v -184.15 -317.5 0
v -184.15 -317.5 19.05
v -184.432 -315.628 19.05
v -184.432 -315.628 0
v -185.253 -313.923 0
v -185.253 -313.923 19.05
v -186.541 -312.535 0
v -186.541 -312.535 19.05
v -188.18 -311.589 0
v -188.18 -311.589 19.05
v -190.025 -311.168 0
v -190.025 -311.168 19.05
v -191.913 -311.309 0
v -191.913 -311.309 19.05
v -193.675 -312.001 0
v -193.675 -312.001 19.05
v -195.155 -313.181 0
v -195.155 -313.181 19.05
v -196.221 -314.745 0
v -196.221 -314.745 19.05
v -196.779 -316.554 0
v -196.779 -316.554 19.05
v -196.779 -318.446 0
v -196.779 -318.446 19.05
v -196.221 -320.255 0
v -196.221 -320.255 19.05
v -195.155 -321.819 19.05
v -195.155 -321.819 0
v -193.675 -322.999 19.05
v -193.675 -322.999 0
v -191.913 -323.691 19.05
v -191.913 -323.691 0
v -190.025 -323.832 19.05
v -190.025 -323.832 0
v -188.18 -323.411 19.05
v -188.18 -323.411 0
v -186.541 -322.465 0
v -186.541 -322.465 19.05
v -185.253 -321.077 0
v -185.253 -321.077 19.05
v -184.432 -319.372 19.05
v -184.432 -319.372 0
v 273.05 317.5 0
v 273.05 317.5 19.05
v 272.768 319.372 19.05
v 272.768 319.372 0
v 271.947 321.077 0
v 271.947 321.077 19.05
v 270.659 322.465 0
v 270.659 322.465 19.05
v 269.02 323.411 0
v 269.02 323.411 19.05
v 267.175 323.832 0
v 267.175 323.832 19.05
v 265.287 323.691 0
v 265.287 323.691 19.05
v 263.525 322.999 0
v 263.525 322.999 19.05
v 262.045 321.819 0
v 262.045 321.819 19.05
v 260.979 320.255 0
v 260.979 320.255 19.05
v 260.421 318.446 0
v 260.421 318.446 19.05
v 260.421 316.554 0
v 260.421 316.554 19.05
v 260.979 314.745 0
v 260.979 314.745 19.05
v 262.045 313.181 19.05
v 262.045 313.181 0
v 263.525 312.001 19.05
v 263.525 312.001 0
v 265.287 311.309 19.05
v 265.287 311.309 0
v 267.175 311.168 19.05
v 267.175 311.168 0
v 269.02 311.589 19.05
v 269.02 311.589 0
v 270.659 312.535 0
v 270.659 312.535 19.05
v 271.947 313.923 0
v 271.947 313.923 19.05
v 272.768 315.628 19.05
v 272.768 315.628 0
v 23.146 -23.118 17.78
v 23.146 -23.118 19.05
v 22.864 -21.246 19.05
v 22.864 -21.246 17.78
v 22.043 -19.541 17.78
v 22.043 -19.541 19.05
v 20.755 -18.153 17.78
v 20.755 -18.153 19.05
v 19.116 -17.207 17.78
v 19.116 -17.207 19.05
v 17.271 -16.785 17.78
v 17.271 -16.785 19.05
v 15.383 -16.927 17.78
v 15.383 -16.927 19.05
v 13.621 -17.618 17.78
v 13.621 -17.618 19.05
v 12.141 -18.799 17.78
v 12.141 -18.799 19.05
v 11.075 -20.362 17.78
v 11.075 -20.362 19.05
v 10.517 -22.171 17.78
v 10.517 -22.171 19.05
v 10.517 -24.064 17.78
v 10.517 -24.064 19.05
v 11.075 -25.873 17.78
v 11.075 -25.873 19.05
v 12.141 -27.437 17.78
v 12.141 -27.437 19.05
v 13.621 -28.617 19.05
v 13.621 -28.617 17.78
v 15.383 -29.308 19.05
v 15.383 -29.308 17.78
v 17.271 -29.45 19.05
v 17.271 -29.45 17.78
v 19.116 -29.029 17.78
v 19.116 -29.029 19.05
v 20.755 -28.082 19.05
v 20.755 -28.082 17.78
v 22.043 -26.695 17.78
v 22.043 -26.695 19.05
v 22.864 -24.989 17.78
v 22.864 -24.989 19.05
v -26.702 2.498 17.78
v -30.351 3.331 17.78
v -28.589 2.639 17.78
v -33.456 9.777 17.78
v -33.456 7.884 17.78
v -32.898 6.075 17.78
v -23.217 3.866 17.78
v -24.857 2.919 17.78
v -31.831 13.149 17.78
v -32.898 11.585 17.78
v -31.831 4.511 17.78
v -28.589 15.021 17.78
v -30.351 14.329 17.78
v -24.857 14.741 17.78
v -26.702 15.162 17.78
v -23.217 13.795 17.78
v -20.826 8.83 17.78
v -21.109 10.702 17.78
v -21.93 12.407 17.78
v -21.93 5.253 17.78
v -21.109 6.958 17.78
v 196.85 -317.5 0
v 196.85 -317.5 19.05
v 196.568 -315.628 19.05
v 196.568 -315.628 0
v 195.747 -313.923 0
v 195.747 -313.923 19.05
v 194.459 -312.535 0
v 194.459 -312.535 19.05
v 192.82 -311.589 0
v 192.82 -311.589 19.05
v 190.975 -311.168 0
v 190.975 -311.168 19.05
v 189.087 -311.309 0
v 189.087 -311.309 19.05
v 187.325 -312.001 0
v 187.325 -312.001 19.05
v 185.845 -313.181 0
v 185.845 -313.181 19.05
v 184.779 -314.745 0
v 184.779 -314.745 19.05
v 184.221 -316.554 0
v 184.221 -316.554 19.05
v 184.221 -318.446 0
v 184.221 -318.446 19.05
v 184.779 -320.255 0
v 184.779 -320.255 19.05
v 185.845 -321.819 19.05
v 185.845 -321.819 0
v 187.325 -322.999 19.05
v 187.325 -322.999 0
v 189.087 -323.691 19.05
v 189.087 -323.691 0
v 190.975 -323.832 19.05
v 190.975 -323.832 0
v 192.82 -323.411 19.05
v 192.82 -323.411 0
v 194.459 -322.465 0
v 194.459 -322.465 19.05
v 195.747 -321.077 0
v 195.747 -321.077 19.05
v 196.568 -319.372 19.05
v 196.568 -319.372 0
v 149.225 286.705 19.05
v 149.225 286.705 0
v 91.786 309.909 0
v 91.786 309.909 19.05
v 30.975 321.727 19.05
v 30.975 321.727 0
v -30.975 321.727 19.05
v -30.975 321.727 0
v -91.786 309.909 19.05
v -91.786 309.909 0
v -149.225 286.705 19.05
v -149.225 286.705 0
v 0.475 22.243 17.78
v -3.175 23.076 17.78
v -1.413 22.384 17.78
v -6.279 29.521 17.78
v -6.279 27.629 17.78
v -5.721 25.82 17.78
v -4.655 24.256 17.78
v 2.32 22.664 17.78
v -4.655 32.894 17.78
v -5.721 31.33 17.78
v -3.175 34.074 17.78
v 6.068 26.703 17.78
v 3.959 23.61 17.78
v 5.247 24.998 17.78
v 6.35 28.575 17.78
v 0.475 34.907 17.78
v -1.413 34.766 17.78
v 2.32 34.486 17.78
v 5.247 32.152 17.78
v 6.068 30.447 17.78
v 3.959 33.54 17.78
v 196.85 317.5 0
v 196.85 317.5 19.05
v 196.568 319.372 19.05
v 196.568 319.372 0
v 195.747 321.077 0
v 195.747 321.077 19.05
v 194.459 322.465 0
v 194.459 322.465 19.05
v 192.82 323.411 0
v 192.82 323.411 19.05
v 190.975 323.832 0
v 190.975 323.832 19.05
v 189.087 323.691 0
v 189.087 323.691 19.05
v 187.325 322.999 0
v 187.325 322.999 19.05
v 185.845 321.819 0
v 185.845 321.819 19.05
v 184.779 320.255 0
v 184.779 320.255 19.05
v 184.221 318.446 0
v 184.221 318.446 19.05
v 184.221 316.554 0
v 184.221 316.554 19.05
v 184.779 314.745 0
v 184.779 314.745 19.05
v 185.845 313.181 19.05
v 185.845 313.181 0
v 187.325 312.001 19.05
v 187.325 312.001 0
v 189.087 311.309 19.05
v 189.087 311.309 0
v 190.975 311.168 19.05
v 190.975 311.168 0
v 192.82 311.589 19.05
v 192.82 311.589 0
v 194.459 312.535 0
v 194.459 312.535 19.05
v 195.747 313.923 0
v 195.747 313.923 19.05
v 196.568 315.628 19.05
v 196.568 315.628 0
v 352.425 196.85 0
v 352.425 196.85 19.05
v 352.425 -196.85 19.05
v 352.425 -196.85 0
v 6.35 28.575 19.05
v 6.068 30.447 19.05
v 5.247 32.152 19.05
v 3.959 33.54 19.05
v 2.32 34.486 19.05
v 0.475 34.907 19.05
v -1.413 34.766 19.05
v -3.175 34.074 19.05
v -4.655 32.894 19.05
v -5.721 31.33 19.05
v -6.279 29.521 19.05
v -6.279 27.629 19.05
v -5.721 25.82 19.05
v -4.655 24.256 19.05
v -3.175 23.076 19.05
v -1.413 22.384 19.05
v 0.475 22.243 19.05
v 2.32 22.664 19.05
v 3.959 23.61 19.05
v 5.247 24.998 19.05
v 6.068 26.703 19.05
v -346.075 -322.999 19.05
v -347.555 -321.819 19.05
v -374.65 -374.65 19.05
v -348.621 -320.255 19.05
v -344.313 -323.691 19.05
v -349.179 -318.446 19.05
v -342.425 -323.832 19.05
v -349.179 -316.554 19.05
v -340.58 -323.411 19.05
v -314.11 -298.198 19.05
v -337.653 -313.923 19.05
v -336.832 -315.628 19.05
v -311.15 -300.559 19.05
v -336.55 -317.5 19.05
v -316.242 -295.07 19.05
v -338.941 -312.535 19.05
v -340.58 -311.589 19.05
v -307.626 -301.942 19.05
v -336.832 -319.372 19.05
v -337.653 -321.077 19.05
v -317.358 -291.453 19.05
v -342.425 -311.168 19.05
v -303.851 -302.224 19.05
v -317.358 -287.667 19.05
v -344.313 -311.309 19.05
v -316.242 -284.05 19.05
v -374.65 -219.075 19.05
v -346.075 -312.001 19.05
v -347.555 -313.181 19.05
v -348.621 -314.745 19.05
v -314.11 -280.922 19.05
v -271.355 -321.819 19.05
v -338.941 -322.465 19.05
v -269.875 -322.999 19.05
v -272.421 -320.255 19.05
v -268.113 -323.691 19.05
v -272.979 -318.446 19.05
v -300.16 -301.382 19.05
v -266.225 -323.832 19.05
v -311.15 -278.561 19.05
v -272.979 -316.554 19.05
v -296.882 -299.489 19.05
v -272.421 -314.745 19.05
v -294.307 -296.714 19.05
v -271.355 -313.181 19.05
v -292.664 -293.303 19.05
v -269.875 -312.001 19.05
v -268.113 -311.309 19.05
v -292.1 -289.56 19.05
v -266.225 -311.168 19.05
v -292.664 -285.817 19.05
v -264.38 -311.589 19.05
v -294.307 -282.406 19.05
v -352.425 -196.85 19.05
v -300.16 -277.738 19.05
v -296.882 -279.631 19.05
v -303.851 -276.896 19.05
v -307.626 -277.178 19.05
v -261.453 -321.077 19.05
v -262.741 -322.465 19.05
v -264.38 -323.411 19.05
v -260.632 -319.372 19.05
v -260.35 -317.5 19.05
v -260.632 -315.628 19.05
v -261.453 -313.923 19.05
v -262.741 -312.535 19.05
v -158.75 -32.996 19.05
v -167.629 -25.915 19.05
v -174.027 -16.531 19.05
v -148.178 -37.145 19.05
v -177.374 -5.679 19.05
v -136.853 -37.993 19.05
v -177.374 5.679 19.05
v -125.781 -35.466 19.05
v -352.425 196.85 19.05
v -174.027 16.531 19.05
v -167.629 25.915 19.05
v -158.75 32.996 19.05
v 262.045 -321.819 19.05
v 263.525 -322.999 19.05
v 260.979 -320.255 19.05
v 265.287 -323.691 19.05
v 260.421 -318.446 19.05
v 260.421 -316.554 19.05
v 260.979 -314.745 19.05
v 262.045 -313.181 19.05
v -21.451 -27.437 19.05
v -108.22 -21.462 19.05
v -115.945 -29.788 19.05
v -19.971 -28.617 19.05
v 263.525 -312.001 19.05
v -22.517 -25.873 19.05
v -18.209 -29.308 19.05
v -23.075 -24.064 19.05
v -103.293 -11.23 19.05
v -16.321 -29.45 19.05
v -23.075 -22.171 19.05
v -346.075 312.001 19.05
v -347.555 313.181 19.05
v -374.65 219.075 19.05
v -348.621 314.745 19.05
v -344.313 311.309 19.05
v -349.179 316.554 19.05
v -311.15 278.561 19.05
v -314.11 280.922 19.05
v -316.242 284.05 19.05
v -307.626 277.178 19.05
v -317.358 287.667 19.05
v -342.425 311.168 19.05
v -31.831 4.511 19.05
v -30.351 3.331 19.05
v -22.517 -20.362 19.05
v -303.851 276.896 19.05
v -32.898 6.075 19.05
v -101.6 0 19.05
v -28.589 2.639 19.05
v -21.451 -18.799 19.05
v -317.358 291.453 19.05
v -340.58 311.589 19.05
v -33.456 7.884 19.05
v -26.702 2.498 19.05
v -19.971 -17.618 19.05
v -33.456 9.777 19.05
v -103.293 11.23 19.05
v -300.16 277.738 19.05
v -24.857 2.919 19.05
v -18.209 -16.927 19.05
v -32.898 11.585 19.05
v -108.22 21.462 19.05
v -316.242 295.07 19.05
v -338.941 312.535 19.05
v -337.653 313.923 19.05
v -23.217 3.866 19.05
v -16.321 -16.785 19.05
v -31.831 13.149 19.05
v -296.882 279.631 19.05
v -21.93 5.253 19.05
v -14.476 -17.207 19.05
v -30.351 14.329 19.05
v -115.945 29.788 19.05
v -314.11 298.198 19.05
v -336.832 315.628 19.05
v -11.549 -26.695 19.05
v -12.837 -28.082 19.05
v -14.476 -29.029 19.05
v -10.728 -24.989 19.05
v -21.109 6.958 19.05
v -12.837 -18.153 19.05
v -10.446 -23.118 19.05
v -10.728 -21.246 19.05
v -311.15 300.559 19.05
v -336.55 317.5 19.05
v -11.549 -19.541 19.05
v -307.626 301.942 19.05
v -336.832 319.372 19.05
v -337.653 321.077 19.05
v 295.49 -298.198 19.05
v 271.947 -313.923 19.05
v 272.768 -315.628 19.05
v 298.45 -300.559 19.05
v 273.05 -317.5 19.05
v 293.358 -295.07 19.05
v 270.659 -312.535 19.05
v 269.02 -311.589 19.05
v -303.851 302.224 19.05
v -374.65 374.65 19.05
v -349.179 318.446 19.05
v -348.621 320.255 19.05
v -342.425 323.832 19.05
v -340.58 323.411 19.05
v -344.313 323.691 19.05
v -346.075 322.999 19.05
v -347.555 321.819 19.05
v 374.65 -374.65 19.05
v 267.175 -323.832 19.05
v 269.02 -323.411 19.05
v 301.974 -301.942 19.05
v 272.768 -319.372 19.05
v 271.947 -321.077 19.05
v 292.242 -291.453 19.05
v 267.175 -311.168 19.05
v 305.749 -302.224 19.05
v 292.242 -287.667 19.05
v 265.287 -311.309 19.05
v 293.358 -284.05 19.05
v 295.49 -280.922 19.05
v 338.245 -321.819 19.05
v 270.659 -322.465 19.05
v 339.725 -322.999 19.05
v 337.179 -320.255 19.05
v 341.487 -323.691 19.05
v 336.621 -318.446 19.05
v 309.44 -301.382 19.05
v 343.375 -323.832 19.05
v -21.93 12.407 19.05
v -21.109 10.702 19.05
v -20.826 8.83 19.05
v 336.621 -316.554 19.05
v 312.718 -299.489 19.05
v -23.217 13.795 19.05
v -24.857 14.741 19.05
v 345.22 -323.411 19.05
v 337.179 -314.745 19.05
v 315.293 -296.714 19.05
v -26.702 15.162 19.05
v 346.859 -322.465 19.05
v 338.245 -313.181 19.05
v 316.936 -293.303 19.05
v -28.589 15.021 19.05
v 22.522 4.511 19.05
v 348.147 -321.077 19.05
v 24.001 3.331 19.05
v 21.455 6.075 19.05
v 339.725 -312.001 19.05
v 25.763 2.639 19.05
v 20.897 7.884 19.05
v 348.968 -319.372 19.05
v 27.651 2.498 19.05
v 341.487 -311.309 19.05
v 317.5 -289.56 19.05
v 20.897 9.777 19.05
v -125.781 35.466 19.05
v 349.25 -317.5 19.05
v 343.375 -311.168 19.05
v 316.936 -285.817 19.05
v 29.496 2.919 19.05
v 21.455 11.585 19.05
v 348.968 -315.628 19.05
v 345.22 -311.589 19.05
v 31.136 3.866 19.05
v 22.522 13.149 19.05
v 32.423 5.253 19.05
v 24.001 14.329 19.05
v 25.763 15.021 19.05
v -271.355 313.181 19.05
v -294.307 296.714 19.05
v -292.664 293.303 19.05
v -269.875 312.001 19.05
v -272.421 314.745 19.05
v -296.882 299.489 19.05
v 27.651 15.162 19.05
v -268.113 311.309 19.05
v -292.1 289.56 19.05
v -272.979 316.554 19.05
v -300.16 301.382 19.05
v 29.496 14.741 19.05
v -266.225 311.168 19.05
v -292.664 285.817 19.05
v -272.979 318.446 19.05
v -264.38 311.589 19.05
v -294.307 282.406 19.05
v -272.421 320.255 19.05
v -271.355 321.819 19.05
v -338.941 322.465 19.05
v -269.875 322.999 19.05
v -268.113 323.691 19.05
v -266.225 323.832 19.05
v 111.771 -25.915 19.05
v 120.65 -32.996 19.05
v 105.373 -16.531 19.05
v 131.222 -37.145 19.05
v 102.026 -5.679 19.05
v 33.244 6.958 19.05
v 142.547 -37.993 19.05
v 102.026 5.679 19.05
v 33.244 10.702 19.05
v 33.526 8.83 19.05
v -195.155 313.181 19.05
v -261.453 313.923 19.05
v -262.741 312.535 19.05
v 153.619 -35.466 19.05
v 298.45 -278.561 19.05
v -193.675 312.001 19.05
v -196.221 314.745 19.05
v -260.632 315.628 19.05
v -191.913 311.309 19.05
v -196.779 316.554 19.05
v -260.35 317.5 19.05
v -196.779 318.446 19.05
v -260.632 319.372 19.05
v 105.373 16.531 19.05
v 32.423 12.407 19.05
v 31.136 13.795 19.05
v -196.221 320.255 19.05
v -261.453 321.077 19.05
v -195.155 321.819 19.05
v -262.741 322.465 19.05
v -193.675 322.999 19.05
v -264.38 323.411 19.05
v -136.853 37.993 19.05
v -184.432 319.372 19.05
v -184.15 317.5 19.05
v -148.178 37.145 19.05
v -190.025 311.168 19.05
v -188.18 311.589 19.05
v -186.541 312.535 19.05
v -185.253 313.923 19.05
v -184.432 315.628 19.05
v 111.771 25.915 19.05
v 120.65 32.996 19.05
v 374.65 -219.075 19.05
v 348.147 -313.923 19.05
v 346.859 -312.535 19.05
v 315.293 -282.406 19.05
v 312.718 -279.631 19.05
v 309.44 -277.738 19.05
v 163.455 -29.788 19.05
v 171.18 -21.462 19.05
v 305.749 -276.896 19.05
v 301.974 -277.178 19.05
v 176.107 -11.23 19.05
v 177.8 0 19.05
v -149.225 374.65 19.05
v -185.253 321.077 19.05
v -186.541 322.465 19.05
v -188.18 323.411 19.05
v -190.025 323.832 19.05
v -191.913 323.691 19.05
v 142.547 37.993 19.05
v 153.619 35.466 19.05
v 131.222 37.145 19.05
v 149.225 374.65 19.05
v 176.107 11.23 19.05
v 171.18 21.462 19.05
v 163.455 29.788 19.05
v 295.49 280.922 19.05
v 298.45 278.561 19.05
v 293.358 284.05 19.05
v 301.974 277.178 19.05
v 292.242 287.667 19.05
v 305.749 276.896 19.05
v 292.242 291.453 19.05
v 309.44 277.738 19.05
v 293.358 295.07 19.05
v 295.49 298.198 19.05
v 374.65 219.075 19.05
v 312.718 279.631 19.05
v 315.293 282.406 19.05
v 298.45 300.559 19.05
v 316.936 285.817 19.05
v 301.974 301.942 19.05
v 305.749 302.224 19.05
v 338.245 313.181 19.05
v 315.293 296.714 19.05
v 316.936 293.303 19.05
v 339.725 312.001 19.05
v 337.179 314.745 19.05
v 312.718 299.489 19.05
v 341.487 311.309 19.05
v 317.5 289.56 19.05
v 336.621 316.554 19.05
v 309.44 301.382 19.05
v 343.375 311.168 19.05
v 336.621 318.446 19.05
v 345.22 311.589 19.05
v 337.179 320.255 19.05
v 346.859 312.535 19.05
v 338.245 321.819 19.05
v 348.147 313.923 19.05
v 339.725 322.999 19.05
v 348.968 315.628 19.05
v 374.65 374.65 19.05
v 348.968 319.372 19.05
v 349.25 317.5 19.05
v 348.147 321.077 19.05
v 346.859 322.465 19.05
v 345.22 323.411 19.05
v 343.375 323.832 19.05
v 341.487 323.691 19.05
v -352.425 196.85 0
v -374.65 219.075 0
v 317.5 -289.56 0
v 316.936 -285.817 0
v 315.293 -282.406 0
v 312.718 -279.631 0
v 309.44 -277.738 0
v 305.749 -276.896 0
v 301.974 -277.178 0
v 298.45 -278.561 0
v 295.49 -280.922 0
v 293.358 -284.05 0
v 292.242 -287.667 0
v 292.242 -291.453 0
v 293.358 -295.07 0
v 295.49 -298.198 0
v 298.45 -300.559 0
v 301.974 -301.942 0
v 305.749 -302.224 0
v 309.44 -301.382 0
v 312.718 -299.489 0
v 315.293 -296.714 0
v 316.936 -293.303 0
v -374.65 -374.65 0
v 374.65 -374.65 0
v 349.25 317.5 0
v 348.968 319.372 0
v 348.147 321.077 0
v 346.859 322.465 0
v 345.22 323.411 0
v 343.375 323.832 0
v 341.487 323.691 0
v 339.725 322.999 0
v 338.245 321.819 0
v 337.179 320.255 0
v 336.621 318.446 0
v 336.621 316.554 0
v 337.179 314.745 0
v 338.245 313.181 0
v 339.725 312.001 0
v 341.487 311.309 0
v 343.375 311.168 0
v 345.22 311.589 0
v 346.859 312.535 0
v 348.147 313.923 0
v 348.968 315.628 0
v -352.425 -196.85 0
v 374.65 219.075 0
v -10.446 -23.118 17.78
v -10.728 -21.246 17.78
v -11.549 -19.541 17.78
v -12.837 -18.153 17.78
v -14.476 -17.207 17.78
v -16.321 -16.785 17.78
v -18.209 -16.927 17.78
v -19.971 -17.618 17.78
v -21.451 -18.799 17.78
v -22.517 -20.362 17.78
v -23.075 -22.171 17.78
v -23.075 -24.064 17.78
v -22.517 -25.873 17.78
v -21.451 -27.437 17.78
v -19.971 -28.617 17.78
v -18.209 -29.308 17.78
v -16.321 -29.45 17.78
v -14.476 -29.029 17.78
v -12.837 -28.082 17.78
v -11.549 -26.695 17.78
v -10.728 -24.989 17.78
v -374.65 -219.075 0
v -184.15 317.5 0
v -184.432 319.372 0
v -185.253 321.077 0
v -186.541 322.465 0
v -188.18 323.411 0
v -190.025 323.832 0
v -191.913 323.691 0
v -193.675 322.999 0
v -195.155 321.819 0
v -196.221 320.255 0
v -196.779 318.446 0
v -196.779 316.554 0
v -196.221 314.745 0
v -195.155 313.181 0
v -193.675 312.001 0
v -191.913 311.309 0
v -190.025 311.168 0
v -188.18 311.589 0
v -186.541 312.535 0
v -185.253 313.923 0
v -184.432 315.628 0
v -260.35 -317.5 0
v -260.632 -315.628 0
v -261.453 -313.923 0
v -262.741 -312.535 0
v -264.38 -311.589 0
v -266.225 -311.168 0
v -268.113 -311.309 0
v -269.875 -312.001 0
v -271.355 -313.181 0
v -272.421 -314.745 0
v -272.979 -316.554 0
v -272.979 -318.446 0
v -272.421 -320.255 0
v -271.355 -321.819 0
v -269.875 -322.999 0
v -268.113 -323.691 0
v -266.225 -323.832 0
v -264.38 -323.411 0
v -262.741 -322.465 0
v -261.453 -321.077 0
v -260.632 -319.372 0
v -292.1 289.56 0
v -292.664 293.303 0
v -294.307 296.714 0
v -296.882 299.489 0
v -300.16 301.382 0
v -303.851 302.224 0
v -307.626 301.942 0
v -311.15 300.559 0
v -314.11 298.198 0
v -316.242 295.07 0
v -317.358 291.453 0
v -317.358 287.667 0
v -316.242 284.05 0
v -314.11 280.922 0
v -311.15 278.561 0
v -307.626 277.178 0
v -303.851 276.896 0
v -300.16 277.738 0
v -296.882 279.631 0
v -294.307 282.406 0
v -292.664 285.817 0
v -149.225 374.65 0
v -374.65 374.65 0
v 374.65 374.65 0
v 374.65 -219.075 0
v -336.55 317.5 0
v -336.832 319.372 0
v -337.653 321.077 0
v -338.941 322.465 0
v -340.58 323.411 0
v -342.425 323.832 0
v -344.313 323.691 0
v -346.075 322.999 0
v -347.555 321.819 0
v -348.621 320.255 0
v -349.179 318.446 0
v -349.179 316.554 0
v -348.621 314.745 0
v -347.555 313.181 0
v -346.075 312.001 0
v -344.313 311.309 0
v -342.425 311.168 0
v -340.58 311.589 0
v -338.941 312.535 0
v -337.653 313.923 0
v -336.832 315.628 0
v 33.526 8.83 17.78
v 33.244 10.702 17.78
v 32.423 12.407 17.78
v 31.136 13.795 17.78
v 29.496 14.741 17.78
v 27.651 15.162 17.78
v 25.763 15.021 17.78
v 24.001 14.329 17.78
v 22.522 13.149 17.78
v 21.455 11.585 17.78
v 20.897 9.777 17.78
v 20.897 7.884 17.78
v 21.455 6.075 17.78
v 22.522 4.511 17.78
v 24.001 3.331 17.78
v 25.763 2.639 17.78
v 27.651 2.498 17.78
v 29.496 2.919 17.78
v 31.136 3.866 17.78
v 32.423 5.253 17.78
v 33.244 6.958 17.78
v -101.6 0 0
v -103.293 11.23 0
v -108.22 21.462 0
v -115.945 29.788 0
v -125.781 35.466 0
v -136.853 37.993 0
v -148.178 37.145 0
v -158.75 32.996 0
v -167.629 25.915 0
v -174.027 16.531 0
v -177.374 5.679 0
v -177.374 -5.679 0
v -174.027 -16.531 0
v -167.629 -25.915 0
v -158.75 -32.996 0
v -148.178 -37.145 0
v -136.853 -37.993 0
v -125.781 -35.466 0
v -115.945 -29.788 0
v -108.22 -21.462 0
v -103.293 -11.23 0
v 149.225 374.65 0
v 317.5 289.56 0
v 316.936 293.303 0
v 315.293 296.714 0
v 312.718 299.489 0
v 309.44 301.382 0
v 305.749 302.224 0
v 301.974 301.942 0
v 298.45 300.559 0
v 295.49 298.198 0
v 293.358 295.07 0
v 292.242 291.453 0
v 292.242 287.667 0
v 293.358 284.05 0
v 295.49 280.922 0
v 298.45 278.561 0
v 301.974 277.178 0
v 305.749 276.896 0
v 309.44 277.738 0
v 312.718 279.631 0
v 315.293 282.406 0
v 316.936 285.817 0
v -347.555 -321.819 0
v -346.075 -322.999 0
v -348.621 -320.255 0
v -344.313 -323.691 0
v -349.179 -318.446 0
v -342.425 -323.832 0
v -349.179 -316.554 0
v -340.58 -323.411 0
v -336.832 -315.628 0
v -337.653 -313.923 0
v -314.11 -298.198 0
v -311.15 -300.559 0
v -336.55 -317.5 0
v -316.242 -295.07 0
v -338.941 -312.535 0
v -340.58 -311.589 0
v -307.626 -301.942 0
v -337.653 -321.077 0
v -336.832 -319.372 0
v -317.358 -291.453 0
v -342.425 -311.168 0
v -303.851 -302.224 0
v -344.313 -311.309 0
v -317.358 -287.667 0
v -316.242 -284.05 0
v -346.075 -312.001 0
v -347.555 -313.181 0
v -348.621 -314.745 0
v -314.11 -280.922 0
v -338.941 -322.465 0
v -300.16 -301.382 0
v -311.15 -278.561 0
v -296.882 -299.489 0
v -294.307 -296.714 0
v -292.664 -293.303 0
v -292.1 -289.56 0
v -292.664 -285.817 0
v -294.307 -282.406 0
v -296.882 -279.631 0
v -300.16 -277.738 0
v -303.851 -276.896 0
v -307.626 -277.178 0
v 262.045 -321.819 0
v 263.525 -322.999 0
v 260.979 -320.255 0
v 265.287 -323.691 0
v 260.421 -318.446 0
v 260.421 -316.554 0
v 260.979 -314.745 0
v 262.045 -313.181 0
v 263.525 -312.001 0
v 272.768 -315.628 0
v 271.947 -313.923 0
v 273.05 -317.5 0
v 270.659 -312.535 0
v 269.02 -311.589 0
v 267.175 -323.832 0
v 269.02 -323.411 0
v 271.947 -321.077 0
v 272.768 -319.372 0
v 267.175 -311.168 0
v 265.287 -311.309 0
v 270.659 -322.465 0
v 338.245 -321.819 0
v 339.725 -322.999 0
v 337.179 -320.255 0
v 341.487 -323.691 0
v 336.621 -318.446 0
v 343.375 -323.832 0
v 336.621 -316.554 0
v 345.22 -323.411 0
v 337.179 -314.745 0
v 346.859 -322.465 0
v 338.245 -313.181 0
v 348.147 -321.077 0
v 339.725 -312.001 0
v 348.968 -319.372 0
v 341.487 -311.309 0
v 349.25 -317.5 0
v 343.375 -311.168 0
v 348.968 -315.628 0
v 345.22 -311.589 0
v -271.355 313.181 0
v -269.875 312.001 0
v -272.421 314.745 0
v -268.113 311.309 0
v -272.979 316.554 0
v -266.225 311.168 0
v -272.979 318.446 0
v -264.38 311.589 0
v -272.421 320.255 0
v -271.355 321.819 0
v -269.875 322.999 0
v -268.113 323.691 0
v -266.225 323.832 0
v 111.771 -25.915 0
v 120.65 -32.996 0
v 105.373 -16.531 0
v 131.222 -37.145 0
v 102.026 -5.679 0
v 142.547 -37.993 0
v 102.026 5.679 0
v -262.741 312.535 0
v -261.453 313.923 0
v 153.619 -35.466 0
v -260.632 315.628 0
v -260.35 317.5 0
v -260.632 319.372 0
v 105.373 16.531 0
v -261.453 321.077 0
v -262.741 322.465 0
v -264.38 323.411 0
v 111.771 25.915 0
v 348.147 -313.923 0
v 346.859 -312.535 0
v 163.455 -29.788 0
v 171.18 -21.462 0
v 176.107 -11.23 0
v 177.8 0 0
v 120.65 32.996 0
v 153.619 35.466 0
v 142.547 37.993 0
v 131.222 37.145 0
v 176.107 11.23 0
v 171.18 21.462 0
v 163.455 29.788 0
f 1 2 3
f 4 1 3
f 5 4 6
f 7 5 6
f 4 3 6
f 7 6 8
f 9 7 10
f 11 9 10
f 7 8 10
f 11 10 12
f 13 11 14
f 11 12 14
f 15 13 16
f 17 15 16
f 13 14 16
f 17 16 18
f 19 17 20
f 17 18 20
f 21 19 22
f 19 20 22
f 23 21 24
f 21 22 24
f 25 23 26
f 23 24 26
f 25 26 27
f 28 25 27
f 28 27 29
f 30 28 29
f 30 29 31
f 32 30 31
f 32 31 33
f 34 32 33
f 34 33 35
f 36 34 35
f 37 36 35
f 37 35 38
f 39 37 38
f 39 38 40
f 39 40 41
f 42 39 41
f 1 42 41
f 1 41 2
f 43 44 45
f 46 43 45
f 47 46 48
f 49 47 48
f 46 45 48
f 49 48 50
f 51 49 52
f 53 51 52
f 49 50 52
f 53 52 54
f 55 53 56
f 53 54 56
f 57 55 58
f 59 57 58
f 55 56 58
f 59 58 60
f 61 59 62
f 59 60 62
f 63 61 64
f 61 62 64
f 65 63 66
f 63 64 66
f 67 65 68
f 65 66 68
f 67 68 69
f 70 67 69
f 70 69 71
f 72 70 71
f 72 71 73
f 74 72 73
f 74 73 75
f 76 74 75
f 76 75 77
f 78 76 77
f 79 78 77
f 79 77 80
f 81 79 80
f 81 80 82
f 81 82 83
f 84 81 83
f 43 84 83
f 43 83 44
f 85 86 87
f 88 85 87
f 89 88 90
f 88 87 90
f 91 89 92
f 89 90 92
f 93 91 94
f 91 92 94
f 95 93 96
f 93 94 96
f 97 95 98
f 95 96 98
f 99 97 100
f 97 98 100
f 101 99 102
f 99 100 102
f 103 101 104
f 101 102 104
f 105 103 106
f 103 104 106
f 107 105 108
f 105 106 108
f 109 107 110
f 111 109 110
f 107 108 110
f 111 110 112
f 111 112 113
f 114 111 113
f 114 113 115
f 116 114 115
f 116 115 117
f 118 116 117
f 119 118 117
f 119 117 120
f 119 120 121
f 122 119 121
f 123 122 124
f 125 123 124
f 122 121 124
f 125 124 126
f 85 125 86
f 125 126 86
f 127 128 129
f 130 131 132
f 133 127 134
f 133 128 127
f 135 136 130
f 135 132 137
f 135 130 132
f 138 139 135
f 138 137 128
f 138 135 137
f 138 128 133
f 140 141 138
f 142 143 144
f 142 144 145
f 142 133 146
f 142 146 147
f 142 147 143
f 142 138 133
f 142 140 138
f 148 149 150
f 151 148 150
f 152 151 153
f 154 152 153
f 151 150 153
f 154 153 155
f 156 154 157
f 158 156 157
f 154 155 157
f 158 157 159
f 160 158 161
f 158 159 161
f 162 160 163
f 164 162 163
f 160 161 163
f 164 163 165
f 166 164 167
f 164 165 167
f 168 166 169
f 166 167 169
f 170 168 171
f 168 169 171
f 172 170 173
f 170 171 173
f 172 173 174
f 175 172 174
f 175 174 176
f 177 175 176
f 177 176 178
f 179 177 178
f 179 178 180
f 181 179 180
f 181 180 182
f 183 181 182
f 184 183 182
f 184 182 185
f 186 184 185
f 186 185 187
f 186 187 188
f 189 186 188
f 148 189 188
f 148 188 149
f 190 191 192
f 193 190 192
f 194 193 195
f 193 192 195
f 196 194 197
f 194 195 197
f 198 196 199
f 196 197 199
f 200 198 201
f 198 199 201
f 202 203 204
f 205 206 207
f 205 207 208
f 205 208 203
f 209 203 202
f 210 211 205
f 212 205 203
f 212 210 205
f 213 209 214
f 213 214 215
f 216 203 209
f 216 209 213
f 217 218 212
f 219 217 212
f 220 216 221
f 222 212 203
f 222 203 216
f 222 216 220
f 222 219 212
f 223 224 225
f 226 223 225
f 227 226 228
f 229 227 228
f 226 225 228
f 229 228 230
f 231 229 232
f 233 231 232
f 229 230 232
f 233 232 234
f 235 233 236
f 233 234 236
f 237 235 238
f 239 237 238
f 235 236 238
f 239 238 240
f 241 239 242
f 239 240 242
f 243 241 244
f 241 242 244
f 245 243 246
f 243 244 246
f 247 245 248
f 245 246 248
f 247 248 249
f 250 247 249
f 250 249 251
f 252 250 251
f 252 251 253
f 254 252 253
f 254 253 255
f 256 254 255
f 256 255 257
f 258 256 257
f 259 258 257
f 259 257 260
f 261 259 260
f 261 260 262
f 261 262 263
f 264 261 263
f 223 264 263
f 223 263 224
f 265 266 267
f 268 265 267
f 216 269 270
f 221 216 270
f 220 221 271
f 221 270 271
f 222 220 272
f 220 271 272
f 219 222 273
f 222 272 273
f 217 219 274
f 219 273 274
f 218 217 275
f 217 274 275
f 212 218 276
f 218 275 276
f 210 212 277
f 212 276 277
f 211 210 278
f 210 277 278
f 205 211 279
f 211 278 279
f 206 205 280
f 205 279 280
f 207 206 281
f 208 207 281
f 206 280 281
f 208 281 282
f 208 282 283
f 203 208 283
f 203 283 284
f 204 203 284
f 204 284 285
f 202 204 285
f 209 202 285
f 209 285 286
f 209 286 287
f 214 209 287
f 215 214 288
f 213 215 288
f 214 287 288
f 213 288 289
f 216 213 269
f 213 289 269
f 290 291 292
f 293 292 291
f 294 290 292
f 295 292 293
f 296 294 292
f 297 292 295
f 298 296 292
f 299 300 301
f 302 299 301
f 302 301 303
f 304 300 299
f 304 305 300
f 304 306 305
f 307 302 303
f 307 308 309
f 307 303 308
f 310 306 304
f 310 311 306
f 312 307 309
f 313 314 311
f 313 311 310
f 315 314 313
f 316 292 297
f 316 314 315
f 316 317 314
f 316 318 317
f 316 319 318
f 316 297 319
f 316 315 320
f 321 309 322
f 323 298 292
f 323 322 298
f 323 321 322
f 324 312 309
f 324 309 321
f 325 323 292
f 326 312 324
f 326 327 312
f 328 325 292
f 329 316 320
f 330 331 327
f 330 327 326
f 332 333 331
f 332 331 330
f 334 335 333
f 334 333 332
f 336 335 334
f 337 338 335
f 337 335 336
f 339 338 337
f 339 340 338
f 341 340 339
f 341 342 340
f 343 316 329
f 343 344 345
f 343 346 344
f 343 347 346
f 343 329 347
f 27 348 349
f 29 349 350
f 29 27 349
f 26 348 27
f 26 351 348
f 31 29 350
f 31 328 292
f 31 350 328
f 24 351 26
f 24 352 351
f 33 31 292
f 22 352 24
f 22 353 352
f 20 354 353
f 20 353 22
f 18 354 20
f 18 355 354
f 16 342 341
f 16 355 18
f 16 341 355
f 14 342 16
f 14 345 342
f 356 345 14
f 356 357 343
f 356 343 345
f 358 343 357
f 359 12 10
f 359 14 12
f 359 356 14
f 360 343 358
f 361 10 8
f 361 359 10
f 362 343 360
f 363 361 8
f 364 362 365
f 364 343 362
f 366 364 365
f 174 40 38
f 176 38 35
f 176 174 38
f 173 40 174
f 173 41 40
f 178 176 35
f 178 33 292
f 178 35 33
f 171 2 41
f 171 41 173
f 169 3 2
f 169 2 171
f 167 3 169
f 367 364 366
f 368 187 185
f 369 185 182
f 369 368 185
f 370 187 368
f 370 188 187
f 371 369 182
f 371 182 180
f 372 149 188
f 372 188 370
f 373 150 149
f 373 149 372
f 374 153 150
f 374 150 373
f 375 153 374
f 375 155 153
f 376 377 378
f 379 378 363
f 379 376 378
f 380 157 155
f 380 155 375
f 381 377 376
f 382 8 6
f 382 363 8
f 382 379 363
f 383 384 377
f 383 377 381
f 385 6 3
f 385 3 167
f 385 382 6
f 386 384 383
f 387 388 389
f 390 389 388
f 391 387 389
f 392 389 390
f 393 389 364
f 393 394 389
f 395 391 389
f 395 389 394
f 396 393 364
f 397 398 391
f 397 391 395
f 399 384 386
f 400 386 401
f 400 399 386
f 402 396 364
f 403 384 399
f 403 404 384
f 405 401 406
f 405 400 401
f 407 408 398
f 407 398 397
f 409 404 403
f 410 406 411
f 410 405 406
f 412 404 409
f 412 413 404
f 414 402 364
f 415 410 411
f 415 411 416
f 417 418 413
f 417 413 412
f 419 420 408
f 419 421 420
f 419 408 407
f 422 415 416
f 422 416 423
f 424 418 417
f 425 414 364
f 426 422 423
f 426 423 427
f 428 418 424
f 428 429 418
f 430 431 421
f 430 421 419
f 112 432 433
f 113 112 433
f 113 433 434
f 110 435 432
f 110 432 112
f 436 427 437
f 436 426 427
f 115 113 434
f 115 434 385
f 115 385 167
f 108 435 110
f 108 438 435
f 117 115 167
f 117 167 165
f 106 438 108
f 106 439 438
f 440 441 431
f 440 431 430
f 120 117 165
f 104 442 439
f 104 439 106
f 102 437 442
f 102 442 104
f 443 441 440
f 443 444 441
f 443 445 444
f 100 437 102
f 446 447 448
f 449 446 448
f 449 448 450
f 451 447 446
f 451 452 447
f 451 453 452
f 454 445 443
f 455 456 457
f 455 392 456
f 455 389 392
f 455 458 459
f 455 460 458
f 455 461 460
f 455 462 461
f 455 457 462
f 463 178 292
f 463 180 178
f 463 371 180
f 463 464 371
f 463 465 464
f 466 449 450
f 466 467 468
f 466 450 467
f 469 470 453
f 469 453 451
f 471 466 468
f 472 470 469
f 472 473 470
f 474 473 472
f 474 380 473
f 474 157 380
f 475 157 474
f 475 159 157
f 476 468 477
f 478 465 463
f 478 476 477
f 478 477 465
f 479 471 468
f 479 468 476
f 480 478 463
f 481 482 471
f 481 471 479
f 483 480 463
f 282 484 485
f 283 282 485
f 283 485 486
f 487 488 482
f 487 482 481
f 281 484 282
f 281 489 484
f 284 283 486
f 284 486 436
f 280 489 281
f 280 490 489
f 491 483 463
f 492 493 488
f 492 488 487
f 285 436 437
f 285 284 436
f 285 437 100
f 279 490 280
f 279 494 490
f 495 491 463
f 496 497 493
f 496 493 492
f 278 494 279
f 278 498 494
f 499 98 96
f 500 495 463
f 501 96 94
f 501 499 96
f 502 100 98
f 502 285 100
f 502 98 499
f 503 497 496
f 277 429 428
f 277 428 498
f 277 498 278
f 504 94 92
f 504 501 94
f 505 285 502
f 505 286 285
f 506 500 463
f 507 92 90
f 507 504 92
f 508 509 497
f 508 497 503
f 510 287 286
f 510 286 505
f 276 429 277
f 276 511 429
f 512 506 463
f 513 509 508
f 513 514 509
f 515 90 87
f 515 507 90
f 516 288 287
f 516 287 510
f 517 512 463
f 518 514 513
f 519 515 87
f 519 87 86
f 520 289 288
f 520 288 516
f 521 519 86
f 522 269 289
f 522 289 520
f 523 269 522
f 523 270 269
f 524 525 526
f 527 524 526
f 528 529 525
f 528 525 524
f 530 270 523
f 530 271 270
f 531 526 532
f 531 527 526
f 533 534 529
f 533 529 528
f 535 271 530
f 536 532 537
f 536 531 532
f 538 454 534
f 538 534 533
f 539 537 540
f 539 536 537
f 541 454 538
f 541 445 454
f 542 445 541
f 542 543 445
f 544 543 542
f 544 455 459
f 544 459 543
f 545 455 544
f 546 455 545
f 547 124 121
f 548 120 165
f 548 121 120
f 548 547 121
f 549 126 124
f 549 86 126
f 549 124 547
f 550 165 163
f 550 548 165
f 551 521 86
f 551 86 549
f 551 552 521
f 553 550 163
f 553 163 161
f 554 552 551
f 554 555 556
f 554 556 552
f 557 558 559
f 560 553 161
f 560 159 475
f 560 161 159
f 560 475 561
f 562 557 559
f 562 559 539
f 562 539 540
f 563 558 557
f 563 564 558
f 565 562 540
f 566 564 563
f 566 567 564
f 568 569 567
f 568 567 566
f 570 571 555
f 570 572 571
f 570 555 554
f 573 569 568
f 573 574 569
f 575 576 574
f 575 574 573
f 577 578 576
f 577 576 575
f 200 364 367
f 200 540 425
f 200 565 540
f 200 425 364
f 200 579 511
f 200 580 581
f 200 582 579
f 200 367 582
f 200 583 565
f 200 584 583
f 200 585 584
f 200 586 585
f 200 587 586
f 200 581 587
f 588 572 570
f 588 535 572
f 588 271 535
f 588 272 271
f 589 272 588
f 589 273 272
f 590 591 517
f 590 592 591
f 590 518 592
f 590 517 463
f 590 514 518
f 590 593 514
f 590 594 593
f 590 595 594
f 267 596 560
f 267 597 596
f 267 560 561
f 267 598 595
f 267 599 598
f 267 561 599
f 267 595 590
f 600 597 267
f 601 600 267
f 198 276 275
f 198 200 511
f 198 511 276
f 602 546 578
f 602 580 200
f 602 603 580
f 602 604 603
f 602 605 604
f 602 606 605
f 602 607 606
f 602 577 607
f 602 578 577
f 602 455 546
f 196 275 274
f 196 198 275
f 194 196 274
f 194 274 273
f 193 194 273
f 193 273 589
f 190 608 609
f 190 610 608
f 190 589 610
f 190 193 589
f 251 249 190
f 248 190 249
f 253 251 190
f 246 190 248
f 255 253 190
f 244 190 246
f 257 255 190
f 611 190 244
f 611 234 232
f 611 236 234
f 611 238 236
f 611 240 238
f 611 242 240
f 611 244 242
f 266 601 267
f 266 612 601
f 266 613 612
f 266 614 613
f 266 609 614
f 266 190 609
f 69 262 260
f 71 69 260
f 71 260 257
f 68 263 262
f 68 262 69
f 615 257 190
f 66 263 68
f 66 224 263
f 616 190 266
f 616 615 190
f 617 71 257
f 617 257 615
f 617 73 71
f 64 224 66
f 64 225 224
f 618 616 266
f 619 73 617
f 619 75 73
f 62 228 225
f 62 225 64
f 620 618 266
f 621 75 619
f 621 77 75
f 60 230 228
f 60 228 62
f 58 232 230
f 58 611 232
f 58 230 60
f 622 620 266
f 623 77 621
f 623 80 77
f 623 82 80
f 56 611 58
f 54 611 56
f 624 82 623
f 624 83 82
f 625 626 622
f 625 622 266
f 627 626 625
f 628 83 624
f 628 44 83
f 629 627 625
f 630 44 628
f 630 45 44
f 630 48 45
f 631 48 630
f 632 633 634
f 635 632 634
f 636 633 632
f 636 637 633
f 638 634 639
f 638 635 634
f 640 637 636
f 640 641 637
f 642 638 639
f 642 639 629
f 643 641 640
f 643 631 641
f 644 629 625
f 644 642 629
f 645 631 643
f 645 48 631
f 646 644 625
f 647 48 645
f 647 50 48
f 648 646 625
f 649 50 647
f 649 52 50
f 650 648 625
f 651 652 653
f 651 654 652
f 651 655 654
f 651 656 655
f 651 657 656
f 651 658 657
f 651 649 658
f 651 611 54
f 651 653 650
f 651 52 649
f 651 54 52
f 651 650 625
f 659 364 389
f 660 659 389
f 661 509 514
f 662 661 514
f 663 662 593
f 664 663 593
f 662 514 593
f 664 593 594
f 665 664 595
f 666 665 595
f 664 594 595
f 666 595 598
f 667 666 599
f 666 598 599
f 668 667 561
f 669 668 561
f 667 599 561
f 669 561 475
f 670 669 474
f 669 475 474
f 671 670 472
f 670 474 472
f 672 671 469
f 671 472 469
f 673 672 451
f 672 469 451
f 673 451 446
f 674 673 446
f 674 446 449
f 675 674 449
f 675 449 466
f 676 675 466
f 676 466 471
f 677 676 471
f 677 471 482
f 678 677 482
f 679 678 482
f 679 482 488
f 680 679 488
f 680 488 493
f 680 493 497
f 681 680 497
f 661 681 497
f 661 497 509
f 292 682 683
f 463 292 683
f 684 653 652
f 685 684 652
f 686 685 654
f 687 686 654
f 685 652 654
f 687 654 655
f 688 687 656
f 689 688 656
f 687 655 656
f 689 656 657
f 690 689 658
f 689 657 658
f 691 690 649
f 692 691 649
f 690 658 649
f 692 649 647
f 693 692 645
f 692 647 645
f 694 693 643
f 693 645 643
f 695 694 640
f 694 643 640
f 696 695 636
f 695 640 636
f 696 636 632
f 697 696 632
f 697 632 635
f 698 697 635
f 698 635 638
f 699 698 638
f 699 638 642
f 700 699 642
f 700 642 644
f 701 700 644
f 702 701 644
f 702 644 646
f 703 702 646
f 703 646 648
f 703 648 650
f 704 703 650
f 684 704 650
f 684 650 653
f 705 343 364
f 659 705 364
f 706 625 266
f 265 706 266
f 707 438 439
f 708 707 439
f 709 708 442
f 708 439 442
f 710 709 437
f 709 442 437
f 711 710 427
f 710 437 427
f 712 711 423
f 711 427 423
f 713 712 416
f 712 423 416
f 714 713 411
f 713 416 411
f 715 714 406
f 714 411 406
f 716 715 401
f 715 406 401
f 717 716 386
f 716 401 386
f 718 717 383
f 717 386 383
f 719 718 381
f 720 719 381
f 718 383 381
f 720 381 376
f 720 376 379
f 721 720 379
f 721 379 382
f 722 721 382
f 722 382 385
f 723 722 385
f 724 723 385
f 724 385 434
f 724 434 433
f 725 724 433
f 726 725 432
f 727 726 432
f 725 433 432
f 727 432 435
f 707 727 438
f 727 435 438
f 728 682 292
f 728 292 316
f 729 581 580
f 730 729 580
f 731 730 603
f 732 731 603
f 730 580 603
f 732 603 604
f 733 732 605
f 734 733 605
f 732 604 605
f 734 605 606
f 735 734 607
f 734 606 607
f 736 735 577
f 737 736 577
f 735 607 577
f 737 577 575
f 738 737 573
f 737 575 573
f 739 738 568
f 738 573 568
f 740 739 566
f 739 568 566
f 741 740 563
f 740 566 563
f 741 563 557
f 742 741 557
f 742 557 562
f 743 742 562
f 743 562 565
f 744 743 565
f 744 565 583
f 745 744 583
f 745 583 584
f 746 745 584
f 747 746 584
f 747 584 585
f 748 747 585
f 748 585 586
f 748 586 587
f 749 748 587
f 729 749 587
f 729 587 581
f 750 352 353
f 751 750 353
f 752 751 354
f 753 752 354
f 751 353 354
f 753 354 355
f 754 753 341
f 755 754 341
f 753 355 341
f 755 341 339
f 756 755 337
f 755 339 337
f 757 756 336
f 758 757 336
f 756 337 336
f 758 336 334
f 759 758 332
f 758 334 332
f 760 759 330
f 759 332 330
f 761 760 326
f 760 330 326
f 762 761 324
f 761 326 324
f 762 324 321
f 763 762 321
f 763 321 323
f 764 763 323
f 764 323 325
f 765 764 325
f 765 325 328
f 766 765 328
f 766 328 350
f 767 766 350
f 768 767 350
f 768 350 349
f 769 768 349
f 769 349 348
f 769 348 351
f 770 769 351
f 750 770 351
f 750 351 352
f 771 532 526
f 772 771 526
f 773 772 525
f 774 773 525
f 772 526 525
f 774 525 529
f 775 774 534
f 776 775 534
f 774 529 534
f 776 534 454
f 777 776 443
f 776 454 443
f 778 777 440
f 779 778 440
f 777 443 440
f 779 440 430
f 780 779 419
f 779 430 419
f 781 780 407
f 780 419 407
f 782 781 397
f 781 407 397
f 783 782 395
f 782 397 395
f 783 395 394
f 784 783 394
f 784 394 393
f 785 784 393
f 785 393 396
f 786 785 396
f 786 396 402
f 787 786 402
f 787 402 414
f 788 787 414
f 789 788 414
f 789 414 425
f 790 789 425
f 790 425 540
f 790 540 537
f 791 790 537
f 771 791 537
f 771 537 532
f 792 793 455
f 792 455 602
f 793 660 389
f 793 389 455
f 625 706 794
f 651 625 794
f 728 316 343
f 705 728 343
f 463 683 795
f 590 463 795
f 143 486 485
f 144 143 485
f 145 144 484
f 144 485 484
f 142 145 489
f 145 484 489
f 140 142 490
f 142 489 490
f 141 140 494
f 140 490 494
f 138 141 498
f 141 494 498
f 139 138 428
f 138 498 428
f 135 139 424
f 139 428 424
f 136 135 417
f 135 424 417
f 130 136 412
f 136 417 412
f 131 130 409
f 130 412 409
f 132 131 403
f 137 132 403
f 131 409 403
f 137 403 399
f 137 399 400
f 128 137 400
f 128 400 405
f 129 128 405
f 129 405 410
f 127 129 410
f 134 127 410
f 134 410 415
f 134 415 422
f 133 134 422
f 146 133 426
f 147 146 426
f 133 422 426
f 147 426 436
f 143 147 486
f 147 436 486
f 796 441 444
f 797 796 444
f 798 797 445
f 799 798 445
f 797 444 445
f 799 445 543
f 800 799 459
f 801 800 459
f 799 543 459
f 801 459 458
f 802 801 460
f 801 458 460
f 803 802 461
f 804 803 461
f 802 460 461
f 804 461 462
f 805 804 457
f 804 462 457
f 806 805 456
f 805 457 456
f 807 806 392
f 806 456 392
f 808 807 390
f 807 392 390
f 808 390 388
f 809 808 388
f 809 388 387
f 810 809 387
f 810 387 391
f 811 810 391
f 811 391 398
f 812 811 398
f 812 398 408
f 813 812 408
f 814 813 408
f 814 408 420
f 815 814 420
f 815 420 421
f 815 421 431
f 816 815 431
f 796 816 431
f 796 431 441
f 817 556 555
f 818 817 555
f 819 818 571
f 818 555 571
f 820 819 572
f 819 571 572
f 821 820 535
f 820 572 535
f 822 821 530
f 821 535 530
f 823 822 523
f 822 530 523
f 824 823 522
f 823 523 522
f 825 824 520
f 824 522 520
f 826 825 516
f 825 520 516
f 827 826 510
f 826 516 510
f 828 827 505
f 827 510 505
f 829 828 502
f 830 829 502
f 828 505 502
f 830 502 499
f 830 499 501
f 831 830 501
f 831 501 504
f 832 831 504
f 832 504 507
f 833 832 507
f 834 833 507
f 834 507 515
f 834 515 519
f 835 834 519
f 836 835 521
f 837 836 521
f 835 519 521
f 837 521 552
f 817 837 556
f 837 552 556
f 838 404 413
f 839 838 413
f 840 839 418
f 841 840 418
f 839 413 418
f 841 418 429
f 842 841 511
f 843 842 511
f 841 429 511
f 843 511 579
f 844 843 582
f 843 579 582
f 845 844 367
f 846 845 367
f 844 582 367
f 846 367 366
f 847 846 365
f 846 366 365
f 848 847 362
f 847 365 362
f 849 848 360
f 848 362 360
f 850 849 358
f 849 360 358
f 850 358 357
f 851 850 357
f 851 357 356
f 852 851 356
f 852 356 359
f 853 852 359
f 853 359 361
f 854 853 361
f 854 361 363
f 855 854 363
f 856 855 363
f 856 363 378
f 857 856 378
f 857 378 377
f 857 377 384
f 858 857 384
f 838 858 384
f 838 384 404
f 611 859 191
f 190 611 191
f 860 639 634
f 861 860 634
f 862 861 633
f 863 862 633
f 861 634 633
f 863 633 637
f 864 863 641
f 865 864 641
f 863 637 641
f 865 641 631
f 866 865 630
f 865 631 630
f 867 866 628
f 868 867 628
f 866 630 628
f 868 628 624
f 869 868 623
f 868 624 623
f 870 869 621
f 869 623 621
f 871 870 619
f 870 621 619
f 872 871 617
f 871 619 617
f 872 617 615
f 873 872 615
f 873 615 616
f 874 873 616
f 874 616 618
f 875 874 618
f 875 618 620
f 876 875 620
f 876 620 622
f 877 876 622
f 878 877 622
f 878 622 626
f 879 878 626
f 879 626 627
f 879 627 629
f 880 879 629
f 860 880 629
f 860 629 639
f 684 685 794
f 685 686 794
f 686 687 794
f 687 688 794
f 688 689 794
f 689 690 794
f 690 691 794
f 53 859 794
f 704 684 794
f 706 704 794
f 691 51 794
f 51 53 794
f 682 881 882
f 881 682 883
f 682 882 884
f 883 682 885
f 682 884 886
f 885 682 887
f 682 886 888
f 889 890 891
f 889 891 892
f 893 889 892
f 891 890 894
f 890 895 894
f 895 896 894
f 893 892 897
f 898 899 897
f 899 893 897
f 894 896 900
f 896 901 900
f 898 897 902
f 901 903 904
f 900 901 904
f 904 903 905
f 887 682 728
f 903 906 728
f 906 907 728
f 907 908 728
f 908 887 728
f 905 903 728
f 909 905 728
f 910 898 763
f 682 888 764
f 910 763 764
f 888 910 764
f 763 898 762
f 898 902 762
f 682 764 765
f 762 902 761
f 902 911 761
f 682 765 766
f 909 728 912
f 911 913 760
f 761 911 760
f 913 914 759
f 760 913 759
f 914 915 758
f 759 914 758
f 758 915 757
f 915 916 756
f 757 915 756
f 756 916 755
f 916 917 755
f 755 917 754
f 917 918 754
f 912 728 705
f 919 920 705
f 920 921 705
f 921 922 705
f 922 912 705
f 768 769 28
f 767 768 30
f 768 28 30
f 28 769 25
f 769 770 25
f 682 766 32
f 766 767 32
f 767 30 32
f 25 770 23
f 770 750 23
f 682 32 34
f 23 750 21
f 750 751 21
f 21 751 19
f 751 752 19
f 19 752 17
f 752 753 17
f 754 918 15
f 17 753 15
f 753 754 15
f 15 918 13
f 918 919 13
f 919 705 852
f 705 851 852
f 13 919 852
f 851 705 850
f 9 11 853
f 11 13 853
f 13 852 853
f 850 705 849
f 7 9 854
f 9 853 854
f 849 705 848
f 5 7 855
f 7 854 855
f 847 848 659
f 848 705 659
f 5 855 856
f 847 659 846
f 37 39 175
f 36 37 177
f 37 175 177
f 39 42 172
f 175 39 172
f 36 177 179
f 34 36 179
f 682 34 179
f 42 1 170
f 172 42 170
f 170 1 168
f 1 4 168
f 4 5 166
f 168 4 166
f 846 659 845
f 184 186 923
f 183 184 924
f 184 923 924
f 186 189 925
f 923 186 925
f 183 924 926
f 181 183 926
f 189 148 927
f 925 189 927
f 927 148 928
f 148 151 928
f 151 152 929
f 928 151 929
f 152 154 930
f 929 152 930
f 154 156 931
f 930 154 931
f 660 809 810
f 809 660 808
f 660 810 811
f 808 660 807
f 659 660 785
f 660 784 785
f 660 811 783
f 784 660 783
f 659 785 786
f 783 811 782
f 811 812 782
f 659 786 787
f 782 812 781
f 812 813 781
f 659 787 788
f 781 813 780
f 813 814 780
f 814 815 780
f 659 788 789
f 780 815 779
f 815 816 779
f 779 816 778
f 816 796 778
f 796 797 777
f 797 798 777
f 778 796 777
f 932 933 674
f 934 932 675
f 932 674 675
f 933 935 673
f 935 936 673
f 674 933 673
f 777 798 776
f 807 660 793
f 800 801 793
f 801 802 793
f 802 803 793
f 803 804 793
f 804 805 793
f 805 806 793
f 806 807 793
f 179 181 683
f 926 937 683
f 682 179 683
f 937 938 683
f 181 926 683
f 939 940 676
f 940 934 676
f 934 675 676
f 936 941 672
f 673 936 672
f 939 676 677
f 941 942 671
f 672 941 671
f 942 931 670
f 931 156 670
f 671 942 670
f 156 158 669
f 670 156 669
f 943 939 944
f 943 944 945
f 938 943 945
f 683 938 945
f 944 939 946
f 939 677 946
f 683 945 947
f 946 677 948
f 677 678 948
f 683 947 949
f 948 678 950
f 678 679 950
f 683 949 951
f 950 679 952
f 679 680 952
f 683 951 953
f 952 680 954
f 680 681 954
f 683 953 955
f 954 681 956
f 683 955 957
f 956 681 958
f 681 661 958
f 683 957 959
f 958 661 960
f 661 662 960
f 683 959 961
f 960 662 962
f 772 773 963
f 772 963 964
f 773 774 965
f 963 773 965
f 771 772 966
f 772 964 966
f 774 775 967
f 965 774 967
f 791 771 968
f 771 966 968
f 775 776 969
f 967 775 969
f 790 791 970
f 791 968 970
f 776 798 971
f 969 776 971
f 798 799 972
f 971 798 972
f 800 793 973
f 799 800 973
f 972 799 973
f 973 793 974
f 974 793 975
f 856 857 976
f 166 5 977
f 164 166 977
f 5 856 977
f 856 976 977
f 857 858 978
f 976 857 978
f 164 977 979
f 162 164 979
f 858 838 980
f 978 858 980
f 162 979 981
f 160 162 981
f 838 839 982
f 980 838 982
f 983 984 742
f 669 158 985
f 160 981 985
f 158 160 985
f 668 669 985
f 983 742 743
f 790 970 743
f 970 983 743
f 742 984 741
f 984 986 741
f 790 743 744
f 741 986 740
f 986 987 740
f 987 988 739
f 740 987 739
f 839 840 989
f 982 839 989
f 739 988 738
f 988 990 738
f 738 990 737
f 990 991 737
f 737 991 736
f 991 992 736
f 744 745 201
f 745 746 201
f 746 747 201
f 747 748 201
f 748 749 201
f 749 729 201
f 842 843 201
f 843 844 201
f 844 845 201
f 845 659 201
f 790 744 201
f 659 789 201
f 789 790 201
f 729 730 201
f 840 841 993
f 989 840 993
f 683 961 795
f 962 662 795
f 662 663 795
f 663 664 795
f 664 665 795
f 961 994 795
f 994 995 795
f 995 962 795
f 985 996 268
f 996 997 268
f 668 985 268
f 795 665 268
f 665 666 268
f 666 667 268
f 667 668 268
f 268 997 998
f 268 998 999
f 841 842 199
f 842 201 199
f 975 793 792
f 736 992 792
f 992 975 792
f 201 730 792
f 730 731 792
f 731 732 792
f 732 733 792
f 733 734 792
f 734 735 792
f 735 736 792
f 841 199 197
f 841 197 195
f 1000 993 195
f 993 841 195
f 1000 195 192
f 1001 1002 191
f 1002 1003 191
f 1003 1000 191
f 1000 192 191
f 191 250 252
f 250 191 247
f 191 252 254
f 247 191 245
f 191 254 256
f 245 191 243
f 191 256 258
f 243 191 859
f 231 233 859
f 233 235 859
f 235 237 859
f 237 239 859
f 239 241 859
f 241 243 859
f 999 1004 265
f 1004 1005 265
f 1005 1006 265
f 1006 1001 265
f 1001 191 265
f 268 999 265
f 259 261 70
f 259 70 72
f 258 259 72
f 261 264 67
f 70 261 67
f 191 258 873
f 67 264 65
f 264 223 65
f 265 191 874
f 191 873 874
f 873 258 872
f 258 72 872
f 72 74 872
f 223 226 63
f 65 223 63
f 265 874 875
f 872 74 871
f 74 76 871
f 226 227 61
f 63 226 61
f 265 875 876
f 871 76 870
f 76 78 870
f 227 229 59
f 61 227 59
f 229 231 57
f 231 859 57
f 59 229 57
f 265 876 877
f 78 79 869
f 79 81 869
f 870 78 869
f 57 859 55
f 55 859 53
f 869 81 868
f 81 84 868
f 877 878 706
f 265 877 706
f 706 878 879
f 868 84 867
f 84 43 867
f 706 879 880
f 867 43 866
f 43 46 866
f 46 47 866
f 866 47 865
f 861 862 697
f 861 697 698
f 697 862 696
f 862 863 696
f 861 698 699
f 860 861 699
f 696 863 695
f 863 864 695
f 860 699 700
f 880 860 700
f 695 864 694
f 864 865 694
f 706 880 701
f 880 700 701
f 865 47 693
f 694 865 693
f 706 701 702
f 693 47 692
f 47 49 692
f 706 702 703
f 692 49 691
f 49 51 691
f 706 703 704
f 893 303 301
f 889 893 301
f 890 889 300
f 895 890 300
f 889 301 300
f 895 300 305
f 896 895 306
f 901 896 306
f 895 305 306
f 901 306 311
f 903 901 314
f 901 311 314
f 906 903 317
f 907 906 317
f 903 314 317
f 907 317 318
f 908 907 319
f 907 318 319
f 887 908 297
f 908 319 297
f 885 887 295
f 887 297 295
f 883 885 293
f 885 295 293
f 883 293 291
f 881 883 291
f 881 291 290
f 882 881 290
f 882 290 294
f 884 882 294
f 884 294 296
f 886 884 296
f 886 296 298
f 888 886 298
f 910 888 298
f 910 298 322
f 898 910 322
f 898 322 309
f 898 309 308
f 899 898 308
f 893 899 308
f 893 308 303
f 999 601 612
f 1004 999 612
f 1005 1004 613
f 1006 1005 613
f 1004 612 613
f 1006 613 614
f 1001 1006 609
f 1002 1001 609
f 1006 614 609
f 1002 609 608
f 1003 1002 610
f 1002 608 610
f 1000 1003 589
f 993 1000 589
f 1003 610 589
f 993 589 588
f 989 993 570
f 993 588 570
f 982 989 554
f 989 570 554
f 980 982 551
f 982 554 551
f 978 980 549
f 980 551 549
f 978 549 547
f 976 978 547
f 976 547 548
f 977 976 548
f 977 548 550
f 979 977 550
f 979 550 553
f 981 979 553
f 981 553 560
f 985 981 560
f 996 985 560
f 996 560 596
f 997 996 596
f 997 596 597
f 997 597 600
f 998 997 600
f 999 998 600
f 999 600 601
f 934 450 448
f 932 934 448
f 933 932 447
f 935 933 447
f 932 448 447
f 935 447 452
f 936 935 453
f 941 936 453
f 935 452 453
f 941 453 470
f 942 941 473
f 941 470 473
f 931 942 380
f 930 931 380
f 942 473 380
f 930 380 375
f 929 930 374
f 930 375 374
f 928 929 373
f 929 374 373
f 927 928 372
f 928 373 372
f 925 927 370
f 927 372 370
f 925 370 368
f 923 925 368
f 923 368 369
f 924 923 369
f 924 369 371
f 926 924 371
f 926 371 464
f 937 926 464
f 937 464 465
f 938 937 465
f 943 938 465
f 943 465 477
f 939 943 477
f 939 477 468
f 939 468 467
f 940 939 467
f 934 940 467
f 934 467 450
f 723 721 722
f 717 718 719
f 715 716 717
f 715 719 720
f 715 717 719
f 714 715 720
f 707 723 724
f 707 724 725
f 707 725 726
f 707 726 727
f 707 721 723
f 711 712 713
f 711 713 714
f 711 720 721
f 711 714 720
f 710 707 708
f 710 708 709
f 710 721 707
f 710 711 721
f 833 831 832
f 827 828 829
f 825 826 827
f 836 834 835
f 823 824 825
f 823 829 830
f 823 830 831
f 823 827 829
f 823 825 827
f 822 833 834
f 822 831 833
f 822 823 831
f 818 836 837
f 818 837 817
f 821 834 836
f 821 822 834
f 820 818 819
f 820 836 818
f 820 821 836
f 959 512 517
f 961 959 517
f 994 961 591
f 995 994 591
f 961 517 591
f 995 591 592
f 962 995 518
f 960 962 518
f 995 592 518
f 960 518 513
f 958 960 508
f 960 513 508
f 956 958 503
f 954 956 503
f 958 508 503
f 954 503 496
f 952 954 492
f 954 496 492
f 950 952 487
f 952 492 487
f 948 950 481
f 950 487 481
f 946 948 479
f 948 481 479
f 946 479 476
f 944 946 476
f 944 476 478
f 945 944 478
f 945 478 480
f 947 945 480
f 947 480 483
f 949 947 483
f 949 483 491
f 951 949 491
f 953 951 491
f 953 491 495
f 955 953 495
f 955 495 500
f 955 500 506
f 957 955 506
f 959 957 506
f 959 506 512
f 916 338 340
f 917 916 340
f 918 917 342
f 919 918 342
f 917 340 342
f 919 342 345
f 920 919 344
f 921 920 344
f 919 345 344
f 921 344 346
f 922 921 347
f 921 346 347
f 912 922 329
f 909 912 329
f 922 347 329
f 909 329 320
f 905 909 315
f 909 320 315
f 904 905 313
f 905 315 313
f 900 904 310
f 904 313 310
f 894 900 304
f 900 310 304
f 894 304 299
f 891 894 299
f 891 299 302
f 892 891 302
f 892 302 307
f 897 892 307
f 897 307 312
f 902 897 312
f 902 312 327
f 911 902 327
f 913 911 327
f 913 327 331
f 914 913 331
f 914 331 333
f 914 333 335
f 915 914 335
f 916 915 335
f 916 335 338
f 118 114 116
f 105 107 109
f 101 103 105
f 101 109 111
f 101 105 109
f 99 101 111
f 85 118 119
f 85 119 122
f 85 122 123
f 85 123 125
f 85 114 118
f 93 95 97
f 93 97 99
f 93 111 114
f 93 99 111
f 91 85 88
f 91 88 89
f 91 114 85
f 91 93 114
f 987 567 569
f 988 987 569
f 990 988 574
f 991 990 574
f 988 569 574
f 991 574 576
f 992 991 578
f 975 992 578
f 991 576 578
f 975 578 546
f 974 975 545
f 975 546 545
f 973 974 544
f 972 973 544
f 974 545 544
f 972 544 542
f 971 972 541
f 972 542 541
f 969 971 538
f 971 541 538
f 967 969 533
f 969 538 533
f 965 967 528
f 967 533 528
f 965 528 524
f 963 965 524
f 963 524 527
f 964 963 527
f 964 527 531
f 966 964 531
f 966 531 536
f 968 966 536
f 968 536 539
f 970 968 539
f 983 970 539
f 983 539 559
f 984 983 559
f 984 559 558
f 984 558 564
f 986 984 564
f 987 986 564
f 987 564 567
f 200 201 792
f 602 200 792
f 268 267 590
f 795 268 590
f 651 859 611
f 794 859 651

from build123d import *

# Parameters (mm, degrees)
F0_W     = 749.3
F0_H     = 749.3
F1_DEPTH = 19.05
F3_DEPTH = 114.3
F4_R     = 6.35
F5_DEPTH = 1.27
F6_R     = 6.35
F6_R_2   = 12.7
F6_R_3   = 38.1
F7_DEPTH = 25.4
F9_DEPTH = 37.592


with BuildPart() as f1:
    # F0 (on Top) → F1 (new body)
    with BuildSketch(Plane.XY):
        Rectangle(F0_W, F0_H)
    extrude(amount=F1_DEPTH)

    # F2 (on face) → F3 (cut)
    with BuildSketch(Plane.XY.offset(19.05)):
        Polygon((-352.425, 196.85), (-374.65, 219.075), (-374.65, -219.075), (-352.425, -196.85), align=None)
        Polygon((374.65, -219.075), (374.65, 219.075), (352.425, 196.85), (352.425, -196.85), align=None)
    extrude(amount=-F3_DEPTH, mode=Mode.SUBTRACT)

    # F4 (on face) → F5 (cut)
    with BuildSketch(Plane.XY.offset(19.05)):
        with Locations((0, 28.575)):
            Circle(F4_R)
        with Locations((-27.17644, 8.830161)):
            Circle(F4_R)
        with Locations((-16.795964, -23.117661)):
            Circle(F4_R)
        with Locations((16.795964, -23.117661)):
            Circle(F4_R)
        with Locations((27.17644, 8.830161)):
            Circle(F4_R)
    extrude(amount=-F5_DEPTH, mode=Mode.SUBTRACT)

    # F6 (on face) → F7 (cut)
    with BuildSketch(Plane.XY.offset(19.05)):
        with Locations((190.5, -317.5)):
            Circle(F6_R)
        with Locations((266.7, -317.5)):
            Circle(F6_R)
        with Locations((342.9, -317.5)):
            Circle(F6_R)
        with Locations((304.8, -289.56)):
            Circle(F6_R_2)
        with Locations((304.8, 289.56)):
            Circle(F6_R_2)
        with Locations((342.9, 317.5)):
            Circle(F6_R)
        with Locations((266.7, 317.5)):
            Circle(F6_R)
        with Locations((190.5, 317.5)):
            Circle(F6_R)
        with Locations((-304.8, -289.56)):
            Circle(F6_R_2)
        with Locations((-342.9, -317.5)):
            Circle(F6_R)
        with Locations((-266.7, -317.5)):
            Circle(F6_R)
        with Locations((-190.5, -317.5)):
            Circle(F6_R)
        with Locations((-190.5, 317.5)):
            Circle(F6_R)
        with Locations((-266.7, 317.5)):
            Circle(F6_R)
        with Locations((-342.9, 317.5)):
            Circle(F6_R)
        with Locations((-304.8, 289.56)):
            Circle(F6_R_2)
        with Locations((-139.7, 0)):
            Circle(F6_R_3)
        with Locations((139.7, 0)):
            Circle(F6_R_3)
    extrude(amount=-F7_DEPTH, mode=Mode.SUBTRACT)

    # F8 (on face) → F9 (cut)
    with BuildSketch(Plane(origin=(0, 0, 0), x_dir=(1, 0, 0), z_dir=(0, 0, -1))):
        with BuildLine():
            Line((-149.225, -374.65), (0, -374.65))
            Line((0, -374.65), (149.225, -374.65))
            Line((149.225, -374.65), (149.225, -287.42081))
            Line((149.225, -287.42081), (149.225, -286.705137))
            ThreePointArc((149.225, -286.705137), (0, -323.215), (-149.225, -286.705137))
            Line((-149.225, -286.705137), (-149.225, -287.42081))
            Line((-149.225, -287.42081), (-149.225, -374.65))
        make_face()
    extrude(amount=-F9_DEPTH, mode=Mode.SUBTRACT)


solid = f1.part
